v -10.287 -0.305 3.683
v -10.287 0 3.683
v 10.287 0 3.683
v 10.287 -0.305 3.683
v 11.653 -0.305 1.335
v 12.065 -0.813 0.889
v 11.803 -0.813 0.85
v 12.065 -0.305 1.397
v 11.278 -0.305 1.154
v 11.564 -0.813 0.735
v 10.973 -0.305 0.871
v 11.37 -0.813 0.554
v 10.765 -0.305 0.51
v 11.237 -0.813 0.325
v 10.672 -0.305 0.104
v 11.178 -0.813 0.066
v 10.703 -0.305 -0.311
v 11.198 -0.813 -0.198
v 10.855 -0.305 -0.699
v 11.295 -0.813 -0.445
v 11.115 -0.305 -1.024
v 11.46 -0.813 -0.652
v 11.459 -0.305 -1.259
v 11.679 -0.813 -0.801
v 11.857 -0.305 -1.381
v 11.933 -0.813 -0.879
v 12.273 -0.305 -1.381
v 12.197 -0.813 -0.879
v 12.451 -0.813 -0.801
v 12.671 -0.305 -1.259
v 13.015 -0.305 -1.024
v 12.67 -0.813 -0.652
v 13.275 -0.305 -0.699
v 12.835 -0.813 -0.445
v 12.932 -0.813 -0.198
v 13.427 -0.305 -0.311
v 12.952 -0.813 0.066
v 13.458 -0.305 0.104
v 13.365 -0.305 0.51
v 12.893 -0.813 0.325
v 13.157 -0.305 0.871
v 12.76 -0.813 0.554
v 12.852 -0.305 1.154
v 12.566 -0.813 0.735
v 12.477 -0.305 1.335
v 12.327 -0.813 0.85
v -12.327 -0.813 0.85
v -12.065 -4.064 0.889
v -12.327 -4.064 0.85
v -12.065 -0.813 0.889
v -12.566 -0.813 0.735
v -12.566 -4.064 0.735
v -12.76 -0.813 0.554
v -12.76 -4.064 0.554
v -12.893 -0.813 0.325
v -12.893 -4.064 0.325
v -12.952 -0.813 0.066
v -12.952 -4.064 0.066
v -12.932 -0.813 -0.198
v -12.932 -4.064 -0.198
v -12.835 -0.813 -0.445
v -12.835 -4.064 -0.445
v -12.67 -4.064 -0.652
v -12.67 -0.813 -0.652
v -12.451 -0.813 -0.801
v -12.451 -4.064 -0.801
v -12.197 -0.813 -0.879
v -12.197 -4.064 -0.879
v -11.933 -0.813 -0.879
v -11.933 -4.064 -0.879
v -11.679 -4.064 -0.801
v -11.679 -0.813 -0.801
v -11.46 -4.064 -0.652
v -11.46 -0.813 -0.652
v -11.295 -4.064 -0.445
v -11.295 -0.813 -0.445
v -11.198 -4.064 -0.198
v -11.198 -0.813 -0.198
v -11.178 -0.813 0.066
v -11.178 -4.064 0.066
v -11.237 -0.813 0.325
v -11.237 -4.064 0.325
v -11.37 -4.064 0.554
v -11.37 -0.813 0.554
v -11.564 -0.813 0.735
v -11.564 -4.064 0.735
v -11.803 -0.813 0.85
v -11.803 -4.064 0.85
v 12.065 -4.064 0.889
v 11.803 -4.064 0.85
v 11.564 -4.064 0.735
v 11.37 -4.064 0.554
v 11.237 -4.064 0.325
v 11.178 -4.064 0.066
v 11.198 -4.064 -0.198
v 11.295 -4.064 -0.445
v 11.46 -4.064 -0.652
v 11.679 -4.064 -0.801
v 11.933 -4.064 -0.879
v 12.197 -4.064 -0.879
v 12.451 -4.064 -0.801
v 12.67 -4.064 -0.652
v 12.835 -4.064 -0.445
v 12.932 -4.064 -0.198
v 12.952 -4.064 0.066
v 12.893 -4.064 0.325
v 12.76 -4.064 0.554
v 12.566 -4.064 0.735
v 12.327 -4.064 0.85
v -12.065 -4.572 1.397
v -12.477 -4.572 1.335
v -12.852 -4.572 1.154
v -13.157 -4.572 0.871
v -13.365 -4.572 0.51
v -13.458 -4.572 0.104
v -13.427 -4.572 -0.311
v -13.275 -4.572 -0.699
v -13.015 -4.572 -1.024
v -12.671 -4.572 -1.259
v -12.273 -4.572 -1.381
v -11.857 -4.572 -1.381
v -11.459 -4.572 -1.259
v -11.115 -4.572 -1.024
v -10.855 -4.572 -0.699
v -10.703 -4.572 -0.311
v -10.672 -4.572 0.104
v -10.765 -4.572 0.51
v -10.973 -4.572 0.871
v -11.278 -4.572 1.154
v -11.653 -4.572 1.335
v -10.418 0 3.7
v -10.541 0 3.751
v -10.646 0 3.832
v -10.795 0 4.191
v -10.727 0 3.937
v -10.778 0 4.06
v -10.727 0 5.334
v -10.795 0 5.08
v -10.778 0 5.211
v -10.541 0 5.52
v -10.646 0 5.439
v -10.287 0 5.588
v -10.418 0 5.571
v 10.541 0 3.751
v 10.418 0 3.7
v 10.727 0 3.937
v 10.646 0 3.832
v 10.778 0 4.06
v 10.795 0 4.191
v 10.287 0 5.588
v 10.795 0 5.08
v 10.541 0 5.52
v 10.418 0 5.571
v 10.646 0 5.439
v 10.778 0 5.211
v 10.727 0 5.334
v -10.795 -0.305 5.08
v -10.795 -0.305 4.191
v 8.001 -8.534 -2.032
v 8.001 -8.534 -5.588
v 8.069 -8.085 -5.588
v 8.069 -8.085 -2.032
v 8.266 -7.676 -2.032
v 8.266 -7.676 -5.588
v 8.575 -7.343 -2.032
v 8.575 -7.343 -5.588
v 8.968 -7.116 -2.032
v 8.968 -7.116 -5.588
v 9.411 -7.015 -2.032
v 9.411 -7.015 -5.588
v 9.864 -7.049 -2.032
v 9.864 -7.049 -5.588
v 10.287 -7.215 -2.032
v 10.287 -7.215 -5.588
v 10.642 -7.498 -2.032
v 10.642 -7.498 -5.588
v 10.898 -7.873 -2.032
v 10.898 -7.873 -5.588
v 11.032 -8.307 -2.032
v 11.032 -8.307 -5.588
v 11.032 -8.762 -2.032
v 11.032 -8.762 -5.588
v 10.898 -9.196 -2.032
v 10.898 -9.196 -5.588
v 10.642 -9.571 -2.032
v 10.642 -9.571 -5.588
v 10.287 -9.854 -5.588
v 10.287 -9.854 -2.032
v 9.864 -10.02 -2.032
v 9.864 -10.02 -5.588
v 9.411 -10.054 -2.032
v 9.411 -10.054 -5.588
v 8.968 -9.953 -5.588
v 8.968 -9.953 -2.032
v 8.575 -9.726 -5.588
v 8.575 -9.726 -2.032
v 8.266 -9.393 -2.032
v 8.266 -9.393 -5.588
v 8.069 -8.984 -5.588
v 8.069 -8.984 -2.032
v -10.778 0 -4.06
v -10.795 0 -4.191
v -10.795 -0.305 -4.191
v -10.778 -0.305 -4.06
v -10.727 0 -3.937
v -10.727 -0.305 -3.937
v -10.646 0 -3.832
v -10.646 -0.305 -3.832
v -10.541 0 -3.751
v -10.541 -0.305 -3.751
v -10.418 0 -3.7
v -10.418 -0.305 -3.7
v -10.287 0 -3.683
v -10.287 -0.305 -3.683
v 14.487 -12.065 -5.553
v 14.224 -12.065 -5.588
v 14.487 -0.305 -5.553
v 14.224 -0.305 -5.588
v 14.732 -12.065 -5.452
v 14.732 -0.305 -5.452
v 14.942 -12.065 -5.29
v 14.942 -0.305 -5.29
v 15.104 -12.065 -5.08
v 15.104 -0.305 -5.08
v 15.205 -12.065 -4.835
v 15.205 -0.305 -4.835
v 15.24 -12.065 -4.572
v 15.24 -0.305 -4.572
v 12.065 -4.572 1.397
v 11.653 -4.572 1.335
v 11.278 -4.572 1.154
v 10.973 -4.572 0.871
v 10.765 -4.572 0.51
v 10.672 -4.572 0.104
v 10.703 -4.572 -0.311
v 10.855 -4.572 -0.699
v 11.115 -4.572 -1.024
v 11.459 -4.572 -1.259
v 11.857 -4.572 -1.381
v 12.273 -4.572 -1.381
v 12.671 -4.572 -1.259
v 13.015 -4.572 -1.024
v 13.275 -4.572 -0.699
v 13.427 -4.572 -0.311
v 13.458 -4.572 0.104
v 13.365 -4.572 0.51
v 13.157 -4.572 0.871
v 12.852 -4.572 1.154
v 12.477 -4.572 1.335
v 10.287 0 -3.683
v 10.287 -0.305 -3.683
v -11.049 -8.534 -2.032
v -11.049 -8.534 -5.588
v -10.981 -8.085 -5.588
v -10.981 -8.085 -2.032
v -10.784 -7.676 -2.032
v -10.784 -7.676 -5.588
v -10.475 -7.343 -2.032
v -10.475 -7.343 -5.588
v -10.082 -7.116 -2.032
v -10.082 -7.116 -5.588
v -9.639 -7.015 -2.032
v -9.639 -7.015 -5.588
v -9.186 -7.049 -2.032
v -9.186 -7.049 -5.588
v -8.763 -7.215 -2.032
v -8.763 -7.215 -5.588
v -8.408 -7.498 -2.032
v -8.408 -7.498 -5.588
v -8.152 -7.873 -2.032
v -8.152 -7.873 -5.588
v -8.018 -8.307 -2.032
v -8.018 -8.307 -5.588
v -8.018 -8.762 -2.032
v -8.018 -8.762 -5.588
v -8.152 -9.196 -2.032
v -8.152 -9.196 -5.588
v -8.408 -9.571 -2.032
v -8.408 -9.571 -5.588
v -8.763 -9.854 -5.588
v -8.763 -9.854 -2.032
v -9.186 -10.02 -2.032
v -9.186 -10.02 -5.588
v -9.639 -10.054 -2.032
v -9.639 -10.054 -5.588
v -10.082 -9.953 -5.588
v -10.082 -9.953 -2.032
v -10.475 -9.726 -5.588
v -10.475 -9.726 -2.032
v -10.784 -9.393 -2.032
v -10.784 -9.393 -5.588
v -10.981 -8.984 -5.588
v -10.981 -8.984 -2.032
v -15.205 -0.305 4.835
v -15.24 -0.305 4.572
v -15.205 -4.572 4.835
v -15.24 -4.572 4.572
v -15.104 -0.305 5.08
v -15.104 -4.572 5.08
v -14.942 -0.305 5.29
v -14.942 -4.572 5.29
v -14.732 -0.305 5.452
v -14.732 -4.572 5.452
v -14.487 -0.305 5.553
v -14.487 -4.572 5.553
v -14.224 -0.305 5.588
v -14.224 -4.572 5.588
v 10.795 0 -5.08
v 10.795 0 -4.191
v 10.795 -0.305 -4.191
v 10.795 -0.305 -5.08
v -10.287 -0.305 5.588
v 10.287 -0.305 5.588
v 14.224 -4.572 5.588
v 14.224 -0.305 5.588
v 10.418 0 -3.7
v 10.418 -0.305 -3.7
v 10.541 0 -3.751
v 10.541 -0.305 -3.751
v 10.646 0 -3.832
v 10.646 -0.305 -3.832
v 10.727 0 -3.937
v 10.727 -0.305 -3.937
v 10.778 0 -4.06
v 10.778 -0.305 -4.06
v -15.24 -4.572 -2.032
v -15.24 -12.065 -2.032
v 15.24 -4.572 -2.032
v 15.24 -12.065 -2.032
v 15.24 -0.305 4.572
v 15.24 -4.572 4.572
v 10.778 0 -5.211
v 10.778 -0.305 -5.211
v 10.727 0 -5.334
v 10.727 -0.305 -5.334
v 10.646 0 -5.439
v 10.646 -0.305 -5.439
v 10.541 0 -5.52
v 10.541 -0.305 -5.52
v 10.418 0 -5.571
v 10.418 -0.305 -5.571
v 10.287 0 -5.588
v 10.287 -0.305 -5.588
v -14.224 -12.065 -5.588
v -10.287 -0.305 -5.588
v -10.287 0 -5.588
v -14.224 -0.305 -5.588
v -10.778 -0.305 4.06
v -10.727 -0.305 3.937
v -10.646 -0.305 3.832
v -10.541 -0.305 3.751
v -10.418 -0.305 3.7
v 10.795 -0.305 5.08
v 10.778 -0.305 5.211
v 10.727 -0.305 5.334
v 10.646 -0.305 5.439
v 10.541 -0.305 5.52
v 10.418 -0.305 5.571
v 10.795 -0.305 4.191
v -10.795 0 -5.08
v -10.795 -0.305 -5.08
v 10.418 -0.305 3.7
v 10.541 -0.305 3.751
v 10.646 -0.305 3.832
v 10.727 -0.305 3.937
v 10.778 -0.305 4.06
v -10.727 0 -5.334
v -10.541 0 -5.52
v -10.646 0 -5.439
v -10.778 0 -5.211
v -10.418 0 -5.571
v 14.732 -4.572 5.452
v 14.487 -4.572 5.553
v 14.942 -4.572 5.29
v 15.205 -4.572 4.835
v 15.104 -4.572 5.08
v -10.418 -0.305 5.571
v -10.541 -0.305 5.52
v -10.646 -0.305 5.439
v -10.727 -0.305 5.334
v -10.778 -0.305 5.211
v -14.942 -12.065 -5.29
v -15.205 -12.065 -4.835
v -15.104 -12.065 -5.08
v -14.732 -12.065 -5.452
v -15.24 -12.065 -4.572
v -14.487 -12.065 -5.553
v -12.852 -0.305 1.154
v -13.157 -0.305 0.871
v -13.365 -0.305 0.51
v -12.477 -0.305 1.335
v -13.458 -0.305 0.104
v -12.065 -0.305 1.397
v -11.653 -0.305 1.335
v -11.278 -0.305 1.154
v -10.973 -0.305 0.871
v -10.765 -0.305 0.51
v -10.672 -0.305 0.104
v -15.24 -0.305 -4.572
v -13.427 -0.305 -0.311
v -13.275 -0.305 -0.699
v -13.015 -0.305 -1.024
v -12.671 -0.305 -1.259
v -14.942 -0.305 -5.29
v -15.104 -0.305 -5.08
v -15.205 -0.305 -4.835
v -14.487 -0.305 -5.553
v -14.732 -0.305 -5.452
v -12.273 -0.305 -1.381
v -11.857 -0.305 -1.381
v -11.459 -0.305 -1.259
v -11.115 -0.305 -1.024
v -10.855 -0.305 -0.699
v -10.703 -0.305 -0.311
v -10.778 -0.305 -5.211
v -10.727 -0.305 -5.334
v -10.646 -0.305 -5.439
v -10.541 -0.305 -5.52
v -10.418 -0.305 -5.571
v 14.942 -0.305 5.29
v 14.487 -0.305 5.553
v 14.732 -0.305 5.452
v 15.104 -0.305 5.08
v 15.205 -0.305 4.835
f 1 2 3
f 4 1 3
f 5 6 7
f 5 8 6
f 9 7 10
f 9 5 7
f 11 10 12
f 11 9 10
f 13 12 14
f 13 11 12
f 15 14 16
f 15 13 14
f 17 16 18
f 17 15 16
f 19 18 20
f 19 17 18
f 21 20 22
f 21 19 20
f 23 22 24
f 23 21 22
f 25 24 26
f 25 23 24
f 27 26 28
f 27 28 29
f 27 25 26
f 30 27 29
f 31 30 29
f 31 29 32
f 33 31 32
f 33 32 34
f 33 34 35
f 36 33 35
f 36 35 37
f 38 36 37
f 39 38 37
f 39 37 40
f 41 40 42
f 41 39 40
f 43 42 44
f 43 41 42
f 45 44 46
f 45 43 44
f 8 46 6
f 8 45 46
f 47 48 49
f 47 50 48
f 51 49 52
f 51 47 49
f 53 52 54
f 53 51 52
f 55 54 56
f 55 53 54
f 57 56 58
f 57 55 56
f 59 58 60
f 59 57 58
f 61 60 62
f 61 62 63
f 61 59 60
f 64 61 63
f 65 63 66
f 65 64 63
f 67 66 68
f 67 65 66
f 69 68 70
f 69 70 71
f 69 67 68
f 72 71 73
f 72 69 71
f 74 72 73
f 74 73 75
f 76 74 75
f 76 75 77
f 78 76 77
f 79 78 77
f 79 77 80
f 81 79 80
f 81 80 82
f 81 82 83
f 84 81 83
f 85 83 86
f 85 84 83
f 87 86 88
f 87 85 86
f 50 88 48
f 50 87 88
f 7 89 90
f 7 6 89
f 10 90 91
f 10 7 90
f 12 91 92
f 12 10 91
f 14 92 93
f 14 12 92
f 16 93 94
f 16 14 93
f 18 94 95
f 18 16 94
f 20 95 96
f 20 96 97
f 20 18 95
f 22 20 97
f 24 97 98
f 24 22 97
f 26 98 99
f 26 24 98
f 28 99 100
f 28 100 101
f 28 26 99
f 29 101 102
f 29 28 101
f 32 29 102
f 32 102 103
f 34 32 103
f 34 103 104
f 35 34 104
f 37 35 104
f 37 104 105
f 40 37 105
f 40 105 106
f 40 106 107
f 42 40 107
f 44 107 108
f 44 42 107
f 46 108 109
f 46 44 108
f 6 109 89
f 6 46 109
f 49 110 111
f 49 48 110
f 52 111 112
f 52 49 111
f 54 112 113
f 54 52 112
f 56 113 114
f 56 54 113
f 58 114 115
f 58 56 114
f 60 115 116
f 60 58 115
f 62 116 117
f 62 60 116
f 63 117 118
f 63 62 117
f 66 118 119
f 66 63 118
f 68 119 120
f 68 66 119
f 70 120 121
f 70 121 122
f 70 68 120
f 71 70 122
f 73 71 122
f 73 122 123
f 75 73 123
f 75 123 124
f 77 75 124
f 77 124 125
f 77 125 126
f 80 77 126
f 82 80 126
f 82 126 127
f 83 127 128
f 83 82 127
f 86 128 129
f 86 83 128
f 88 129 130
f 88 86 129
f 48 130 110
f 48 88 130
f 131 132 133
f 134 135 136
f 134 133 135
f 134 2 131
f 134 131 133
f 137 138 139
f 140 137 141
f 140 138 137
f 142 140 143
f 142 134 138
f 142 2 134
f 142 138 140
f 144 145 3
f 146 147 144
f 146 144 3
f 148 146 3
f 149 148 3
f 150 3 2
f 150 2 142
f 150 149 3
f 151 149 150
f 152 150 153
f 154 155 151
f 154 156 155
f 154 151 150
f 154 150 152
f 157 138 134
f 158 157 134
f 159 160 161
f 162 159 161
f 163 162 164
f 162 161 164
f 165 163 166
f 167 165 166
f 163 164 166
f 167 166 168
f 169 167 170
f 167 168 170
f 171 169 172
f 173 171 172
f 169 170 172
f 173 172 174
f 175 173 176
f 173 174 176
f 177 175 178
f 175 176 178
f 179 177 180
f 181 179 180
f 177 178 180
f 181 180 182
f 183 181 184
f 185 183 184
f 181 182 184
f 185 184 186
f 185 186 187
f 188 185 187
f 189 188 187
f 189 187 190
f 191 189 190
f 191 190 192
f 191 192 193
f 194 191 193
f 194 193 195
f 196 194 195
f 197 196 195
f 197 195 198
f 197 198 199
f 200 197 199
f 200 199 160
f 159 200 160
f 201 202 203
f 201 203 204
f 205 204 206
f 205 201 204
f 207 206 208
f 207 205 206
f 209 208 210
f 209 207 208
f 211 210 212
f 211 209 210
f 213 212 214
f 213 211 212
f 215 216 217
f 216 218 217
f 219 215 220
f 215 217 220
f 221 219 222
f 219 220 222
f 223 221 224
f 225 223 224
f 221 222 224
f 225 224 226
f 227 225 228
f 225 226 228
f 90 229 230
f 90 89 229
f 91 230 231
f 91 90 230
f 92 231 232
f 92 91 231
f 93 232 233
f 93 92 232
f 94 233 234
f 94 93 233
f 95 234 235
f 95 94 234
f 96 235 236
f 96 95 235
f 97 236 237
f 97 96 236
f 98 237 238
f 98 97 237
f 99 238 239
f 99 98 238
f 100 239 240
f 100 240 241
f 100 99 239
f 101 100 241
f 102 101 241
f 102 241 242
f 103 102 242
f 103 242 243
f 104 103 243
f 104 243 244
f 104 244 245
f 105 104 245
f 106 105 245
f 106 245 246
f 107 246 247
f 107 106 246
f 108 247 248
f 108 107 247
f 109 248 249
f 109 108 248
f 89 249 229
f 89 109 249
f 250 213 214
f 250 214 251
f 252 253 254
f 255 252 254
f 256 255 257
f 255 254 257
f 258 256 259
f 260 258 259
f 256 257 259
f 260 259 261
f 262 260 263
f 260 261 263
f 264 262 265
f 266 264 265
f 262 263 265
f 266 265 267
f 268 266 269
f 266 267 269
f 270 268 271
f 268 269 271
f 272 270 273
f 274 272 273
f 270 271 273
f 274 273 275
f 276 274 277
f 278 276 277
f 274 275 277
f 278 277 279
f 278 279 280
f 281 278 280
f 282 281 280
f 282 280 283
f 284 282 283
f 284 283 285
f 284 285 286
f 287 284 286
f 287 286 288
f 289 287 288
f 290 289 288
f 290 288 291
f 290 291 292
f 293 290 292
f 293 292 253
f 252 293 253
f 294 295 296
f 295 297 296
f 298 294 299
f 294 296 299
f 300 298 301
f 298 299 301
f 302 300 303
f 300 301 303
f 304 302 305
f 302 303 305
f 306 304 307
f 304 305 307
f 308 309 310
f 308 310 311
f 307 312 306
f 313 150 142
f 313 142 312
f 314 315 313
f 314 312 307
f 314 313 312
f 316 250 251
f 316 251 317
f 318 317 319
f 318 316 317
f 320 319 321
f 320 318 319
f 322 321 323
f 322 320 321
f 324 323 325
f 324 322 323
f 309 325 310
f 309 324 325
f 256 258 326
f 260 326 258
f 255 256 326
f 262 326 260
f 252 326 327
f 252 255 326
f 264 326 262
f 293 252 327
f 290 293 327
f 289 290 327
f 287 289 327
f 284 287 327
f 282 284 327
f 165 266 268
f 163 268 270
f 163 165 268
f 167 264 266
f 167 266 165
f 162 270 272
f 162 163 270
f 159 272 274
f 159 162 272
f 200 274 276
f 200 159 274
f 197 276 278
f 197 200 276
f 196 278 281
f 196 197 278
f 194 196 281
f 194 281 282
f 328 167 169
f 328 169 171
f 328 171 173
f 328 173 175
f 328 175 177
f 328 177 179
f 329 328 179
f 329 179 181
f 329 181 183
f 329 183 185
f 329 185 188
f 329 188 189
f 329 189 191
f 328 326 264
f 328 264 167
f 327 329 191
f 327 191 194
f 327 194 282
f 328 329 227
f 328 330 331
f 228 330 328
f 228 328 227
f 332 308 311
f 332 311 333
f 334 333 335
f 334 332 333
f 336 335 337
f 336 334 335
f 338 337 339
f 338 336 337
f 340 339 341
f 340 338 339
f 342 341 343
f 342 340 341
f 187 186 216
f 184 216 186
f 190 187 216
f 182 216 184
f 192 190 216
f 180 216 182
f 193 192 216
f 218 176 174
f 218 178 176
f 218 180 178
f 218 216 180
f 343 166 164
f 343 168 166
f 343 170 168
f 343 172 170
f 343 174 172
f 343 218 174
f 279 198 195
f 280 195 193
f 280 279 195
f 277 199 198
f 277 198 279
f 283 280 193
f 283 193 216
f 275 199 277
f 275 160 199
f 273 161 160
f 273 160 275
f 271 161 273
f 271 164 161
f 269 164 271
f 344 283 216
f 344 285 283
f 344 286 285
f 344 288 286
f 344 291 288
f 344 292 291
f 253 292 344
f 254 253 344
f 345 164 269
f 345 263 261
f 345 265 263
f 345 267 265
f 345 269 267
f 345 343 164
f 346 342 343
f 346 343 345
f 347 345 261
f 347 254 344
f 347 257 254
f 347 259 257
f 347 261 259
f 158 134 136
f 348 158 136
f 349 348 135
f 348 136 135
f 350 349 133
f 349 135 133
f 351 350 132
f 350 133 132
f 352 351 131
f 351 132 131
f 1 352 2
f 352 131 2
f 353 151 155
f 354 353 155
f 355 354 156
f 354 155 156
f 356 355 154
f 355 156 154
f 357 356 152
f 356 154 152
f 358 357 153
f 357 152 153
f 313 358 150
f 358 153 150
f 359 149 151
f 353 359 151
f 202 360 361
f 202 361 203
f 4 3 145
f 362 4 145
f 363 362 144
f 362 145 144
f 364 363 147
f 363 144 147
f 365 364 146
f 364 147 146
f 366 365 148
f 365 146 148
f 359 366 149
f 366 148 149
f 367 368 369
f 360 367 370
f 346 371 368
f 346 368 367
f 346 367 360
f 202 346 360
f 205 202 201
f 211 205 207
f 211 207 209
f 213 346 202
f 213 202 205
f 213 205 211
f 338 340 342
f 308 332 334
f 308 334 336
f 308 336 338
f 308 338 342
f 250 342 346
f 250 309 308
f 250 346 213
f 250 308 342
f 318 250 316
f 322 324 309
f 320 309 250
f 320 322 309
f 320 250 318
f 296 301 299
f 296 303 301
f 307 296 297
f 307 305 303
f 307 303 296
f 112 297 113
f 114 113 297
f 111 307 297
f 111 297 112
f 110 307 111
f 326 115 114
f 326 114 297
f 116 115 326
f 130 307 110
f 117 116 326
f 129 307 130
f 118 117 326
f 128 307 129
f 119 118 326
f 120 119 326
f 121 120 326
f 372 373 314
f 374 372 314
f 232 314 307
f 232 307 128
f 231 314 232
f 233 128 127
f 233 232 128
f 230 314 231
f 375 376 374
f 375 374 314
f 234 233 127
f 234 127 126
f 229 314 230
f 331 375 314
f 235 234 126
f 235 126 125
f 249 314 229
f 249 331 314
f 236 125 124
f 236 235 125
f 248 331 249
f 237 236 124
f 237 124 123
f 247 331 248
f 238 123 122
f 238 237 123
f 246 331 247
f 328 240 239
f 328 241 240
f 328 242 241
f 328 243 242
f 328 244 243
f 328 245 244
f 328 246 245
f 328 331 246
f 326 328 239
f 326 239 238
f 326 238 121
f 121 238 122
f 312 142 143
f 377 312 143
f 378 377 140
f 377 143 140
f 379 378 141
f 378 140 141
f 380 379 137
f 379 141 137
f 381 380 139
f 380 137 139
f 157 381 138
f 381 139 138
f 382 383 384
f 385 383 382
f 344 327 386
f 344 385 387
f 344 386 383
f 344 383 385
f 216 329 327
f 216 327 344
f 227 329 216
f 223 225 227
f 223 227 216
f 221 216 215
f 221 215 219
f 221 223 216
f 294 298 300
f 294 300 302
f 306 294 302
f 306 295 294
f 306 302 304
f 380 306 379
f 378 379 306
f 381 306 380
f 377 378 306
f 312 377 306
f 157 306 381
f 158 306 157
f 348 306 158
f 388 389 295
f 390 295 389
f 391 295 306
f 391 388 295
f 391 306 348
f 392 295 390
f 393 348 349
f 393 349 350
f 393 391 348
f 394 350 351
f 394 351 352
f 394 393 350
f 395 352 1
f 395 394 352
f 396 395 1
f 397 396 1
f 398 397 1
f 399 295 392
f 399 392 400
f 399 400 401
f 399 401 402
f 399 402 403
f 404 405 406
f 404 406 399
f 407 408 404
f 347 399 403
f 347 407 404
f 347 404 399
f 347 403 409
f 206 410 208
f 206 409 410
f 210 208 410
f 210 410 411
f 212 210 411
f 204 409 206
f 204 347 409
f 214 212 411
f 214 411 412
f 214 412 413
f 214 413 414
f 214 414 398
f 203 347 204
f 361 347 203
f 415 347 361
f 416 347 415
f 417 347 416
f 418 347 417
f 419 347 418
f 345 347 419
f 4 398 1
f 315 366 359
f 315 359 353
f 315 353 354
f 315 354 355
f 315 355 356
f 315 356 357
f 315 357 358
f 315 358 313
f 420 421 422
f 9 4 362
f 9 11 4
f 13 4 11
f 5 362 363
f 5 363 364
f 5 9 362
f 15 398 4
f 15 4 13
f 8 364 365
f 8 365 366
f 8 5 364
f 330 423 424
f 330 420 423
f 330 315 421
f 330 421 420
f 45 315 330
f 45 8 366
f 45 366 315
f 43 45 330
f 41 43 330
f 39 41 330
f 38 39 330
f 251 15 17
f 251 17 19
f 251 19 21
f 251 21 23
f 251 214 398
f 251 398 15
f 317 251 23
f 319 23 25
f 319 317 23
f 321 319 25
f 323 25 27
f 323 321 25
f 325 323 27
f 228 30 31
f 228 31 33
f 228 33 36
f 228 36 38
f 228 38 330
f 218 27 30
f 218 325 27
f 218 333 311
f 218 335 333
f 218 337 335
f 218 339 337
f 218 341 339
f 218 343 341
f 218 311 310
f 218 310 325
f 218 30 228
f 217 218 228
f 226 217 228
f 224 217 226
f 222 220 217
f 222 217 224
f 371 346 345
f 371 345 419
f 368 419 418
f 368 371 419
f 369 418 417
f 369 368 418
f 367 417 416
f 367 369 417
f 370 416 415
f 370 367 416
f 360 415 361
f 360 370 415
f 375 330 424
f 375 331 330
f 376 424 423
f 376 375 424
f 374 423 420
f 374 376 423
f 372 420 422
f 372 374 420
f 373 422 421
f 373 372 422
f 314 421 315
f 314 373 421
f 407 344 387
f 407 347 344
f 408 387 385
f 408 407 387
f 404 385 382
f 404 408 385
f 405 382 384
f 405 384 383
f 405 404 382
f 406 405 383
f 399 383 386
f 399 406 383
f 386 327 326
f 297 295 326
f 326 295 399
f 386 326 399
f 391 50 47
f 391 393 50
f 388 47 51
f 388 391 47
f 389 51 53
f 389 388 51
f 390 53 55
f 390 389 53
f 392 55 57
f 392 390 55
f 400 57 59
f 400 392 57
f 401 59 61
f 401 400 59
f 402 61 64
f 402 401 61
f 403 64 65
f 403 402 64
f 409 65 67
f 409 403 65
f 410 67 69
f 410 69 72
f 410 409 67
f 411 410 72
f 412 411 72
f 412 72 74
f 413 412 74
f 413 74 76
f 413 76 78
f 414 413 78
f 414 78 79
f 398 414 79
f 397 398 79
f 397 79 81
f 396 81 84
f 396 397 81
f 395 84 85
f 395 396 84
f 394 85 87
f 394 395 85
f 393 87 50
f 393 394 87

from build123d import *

# Parameters (mm, degrees)
BOSS_EXTRUDE1_DEPTH            = 15.24
SKETCH7_OUTSIDE_W              = 39.406
SKETCH7_OUTSIDE_H              = 20.102
CUT_EXTRUDE2_DEPTH             = 0.3048
F_2_56_TAPPED_HOLE1_AT_2_COUNT = 2
F_2_56_TAPPED_HOLE1_AT_2_PITCH = 24.13
F_31_0_12_DIAMETER_HOLE1_D     = 3.048
FILLET1_R                      = 1.016


with BuildPart() as part:
    # Sketch1 → Boss-Extrude1 (new, symmetric)
    with BuildSketch(Plane(origin=(0, 0, 0), x_dir=(0, 0, -1), z_dir=(1, 0, 0))):
        Polygon((5.588, 0), (-5.588, 0), (-5.588, -4.572), (2.032, -4.572), (2.032, -12.065), (5.588, -12.065), align=None)
    extrude(amount=BOSS_EXTRUDE1_DEPTH, both=True)

    # Sketch7 outside → Cut-Extrude2 (cut)
    with BuildSketch(Plane(origin=(0, 0, 0), x_dir=(1, 0, 0), z_dir=(0, 1, 0))):
        Rectangle(SKETCH7_OUTSIDE_W, SKETCH7_OUTSIDE_H)
        with BuildLine():
            Line((10.795, -4.191), (10.795, -5.08))
            ThreePointArc((10.795, -5.08), (10.646210245, -5.439210245), (10.287, -5.588))
            Line((10.287, -5.588), (-10.287, -5.588))
            ThreePointArc((-10.287, -5.588), (-10.646210245, -5.439210245), (-10.795, -5.08))
            Line((-10.795, -5.08), (-10.795, -4.191))
            ThreePointArc((-10.795, -4.191), (-10.646210245, -3.831789755), (-10.287, -3.683))
            Line((-10.287, -3.683), (10.287, -3.683))
            ThreePointArc((10.287, -3.683), (10.646210245, -3.831789755), (10.795, -4.191))
        make_face(mode=Mode.SUBTRACT)
        with BuildLine():
            Line((-10.287, 3.683), (10.287, 3.683))
            ThreePointArc((10.287, 3.683), (10.646210245, 3.831789755), (10.795, 4.191))
            Line((10.795, 4.191), (10.795, 5.08))
            ThreePointArc((10.795, 5.08), (10.646210245, 5.439210245), (10.287, 5.588))
            Line((10.287, 5.588), (-10.287, 5.588))
            ThreePointArc((-10.287, 5.588), (-10.646210245, 5.439210245), (-10.795, 5.08))
            Line((-10.795, 5.08), (-10.795, 4.191))
            ThreePointArc((-10.795, 4.191), (-10.646210245, 3.831789755), (-10.287, 3.683))
        make_face(mode=Mode.SUBTRACT)
    extrude(amount=-CUT_EXTRUDE2_DEPTH, mode=Mode.SUBTRACT)

    # Sketch2 → #2-56 Tapped Hole1 (revolve, cut)
    with BuildSketch(Plane(origin=(-12.065, -0.3048, 0), x_dir=(0, 0, 1), z_dir=(1, 0, 0))):
        Polygon((0, 0), (0, 4.2672), (1.397, 4.2672), (0.889, 3.7592), (0.889, 0.508), (1.397, 0), align=None)
    f_2_56_tapped_hole1 = revolve(axis=Axis((-12.065, 6.0452, 0), (0, -1, 0)), mode=Mode.SUBTRACT)

    # #2-56 Tapped Hole1 at 2: #2-56 Tapped Hole1 ×2
    with Locations(*[(i * F_2_56_TAPPED_HOLE1_AT_2_PITCH, 0, 0) for i in range(1, F_2_56_TAPPED_HOLE1_AT_2_COUNT)]):
        add(f_2_56_tapped_hole1, mode=Mode.SUBTRACT)

    # #31 (0.12) Diameter Hole1 (through all)
    with Locations(Plane(origin=(-4.633152105, -2.095479982, -2.032), x_dir=(1, 0, 0), z_dir=(0, 0, 1))):
        with Locations((-4.891847895, -6.438920018), (14.158152105, -6.438920018)):
            Hole(F_31_0_12_DIAMETER_HOLE1_D / 2)

    # Fillet1
    fillet1_edges = [part.edges().sort_by_distance(p)[0] for p in [
        (-15.24, -2.4384, 5.588),
        (15.24, -2.4384, 5.588),
        (15.24, -6.1849, -5.588),
        (-15.24, -6.1849, -5.588),
    ]]
    fillet(fillet1_edges, radius=FILLET1_R)


solid = part.part
